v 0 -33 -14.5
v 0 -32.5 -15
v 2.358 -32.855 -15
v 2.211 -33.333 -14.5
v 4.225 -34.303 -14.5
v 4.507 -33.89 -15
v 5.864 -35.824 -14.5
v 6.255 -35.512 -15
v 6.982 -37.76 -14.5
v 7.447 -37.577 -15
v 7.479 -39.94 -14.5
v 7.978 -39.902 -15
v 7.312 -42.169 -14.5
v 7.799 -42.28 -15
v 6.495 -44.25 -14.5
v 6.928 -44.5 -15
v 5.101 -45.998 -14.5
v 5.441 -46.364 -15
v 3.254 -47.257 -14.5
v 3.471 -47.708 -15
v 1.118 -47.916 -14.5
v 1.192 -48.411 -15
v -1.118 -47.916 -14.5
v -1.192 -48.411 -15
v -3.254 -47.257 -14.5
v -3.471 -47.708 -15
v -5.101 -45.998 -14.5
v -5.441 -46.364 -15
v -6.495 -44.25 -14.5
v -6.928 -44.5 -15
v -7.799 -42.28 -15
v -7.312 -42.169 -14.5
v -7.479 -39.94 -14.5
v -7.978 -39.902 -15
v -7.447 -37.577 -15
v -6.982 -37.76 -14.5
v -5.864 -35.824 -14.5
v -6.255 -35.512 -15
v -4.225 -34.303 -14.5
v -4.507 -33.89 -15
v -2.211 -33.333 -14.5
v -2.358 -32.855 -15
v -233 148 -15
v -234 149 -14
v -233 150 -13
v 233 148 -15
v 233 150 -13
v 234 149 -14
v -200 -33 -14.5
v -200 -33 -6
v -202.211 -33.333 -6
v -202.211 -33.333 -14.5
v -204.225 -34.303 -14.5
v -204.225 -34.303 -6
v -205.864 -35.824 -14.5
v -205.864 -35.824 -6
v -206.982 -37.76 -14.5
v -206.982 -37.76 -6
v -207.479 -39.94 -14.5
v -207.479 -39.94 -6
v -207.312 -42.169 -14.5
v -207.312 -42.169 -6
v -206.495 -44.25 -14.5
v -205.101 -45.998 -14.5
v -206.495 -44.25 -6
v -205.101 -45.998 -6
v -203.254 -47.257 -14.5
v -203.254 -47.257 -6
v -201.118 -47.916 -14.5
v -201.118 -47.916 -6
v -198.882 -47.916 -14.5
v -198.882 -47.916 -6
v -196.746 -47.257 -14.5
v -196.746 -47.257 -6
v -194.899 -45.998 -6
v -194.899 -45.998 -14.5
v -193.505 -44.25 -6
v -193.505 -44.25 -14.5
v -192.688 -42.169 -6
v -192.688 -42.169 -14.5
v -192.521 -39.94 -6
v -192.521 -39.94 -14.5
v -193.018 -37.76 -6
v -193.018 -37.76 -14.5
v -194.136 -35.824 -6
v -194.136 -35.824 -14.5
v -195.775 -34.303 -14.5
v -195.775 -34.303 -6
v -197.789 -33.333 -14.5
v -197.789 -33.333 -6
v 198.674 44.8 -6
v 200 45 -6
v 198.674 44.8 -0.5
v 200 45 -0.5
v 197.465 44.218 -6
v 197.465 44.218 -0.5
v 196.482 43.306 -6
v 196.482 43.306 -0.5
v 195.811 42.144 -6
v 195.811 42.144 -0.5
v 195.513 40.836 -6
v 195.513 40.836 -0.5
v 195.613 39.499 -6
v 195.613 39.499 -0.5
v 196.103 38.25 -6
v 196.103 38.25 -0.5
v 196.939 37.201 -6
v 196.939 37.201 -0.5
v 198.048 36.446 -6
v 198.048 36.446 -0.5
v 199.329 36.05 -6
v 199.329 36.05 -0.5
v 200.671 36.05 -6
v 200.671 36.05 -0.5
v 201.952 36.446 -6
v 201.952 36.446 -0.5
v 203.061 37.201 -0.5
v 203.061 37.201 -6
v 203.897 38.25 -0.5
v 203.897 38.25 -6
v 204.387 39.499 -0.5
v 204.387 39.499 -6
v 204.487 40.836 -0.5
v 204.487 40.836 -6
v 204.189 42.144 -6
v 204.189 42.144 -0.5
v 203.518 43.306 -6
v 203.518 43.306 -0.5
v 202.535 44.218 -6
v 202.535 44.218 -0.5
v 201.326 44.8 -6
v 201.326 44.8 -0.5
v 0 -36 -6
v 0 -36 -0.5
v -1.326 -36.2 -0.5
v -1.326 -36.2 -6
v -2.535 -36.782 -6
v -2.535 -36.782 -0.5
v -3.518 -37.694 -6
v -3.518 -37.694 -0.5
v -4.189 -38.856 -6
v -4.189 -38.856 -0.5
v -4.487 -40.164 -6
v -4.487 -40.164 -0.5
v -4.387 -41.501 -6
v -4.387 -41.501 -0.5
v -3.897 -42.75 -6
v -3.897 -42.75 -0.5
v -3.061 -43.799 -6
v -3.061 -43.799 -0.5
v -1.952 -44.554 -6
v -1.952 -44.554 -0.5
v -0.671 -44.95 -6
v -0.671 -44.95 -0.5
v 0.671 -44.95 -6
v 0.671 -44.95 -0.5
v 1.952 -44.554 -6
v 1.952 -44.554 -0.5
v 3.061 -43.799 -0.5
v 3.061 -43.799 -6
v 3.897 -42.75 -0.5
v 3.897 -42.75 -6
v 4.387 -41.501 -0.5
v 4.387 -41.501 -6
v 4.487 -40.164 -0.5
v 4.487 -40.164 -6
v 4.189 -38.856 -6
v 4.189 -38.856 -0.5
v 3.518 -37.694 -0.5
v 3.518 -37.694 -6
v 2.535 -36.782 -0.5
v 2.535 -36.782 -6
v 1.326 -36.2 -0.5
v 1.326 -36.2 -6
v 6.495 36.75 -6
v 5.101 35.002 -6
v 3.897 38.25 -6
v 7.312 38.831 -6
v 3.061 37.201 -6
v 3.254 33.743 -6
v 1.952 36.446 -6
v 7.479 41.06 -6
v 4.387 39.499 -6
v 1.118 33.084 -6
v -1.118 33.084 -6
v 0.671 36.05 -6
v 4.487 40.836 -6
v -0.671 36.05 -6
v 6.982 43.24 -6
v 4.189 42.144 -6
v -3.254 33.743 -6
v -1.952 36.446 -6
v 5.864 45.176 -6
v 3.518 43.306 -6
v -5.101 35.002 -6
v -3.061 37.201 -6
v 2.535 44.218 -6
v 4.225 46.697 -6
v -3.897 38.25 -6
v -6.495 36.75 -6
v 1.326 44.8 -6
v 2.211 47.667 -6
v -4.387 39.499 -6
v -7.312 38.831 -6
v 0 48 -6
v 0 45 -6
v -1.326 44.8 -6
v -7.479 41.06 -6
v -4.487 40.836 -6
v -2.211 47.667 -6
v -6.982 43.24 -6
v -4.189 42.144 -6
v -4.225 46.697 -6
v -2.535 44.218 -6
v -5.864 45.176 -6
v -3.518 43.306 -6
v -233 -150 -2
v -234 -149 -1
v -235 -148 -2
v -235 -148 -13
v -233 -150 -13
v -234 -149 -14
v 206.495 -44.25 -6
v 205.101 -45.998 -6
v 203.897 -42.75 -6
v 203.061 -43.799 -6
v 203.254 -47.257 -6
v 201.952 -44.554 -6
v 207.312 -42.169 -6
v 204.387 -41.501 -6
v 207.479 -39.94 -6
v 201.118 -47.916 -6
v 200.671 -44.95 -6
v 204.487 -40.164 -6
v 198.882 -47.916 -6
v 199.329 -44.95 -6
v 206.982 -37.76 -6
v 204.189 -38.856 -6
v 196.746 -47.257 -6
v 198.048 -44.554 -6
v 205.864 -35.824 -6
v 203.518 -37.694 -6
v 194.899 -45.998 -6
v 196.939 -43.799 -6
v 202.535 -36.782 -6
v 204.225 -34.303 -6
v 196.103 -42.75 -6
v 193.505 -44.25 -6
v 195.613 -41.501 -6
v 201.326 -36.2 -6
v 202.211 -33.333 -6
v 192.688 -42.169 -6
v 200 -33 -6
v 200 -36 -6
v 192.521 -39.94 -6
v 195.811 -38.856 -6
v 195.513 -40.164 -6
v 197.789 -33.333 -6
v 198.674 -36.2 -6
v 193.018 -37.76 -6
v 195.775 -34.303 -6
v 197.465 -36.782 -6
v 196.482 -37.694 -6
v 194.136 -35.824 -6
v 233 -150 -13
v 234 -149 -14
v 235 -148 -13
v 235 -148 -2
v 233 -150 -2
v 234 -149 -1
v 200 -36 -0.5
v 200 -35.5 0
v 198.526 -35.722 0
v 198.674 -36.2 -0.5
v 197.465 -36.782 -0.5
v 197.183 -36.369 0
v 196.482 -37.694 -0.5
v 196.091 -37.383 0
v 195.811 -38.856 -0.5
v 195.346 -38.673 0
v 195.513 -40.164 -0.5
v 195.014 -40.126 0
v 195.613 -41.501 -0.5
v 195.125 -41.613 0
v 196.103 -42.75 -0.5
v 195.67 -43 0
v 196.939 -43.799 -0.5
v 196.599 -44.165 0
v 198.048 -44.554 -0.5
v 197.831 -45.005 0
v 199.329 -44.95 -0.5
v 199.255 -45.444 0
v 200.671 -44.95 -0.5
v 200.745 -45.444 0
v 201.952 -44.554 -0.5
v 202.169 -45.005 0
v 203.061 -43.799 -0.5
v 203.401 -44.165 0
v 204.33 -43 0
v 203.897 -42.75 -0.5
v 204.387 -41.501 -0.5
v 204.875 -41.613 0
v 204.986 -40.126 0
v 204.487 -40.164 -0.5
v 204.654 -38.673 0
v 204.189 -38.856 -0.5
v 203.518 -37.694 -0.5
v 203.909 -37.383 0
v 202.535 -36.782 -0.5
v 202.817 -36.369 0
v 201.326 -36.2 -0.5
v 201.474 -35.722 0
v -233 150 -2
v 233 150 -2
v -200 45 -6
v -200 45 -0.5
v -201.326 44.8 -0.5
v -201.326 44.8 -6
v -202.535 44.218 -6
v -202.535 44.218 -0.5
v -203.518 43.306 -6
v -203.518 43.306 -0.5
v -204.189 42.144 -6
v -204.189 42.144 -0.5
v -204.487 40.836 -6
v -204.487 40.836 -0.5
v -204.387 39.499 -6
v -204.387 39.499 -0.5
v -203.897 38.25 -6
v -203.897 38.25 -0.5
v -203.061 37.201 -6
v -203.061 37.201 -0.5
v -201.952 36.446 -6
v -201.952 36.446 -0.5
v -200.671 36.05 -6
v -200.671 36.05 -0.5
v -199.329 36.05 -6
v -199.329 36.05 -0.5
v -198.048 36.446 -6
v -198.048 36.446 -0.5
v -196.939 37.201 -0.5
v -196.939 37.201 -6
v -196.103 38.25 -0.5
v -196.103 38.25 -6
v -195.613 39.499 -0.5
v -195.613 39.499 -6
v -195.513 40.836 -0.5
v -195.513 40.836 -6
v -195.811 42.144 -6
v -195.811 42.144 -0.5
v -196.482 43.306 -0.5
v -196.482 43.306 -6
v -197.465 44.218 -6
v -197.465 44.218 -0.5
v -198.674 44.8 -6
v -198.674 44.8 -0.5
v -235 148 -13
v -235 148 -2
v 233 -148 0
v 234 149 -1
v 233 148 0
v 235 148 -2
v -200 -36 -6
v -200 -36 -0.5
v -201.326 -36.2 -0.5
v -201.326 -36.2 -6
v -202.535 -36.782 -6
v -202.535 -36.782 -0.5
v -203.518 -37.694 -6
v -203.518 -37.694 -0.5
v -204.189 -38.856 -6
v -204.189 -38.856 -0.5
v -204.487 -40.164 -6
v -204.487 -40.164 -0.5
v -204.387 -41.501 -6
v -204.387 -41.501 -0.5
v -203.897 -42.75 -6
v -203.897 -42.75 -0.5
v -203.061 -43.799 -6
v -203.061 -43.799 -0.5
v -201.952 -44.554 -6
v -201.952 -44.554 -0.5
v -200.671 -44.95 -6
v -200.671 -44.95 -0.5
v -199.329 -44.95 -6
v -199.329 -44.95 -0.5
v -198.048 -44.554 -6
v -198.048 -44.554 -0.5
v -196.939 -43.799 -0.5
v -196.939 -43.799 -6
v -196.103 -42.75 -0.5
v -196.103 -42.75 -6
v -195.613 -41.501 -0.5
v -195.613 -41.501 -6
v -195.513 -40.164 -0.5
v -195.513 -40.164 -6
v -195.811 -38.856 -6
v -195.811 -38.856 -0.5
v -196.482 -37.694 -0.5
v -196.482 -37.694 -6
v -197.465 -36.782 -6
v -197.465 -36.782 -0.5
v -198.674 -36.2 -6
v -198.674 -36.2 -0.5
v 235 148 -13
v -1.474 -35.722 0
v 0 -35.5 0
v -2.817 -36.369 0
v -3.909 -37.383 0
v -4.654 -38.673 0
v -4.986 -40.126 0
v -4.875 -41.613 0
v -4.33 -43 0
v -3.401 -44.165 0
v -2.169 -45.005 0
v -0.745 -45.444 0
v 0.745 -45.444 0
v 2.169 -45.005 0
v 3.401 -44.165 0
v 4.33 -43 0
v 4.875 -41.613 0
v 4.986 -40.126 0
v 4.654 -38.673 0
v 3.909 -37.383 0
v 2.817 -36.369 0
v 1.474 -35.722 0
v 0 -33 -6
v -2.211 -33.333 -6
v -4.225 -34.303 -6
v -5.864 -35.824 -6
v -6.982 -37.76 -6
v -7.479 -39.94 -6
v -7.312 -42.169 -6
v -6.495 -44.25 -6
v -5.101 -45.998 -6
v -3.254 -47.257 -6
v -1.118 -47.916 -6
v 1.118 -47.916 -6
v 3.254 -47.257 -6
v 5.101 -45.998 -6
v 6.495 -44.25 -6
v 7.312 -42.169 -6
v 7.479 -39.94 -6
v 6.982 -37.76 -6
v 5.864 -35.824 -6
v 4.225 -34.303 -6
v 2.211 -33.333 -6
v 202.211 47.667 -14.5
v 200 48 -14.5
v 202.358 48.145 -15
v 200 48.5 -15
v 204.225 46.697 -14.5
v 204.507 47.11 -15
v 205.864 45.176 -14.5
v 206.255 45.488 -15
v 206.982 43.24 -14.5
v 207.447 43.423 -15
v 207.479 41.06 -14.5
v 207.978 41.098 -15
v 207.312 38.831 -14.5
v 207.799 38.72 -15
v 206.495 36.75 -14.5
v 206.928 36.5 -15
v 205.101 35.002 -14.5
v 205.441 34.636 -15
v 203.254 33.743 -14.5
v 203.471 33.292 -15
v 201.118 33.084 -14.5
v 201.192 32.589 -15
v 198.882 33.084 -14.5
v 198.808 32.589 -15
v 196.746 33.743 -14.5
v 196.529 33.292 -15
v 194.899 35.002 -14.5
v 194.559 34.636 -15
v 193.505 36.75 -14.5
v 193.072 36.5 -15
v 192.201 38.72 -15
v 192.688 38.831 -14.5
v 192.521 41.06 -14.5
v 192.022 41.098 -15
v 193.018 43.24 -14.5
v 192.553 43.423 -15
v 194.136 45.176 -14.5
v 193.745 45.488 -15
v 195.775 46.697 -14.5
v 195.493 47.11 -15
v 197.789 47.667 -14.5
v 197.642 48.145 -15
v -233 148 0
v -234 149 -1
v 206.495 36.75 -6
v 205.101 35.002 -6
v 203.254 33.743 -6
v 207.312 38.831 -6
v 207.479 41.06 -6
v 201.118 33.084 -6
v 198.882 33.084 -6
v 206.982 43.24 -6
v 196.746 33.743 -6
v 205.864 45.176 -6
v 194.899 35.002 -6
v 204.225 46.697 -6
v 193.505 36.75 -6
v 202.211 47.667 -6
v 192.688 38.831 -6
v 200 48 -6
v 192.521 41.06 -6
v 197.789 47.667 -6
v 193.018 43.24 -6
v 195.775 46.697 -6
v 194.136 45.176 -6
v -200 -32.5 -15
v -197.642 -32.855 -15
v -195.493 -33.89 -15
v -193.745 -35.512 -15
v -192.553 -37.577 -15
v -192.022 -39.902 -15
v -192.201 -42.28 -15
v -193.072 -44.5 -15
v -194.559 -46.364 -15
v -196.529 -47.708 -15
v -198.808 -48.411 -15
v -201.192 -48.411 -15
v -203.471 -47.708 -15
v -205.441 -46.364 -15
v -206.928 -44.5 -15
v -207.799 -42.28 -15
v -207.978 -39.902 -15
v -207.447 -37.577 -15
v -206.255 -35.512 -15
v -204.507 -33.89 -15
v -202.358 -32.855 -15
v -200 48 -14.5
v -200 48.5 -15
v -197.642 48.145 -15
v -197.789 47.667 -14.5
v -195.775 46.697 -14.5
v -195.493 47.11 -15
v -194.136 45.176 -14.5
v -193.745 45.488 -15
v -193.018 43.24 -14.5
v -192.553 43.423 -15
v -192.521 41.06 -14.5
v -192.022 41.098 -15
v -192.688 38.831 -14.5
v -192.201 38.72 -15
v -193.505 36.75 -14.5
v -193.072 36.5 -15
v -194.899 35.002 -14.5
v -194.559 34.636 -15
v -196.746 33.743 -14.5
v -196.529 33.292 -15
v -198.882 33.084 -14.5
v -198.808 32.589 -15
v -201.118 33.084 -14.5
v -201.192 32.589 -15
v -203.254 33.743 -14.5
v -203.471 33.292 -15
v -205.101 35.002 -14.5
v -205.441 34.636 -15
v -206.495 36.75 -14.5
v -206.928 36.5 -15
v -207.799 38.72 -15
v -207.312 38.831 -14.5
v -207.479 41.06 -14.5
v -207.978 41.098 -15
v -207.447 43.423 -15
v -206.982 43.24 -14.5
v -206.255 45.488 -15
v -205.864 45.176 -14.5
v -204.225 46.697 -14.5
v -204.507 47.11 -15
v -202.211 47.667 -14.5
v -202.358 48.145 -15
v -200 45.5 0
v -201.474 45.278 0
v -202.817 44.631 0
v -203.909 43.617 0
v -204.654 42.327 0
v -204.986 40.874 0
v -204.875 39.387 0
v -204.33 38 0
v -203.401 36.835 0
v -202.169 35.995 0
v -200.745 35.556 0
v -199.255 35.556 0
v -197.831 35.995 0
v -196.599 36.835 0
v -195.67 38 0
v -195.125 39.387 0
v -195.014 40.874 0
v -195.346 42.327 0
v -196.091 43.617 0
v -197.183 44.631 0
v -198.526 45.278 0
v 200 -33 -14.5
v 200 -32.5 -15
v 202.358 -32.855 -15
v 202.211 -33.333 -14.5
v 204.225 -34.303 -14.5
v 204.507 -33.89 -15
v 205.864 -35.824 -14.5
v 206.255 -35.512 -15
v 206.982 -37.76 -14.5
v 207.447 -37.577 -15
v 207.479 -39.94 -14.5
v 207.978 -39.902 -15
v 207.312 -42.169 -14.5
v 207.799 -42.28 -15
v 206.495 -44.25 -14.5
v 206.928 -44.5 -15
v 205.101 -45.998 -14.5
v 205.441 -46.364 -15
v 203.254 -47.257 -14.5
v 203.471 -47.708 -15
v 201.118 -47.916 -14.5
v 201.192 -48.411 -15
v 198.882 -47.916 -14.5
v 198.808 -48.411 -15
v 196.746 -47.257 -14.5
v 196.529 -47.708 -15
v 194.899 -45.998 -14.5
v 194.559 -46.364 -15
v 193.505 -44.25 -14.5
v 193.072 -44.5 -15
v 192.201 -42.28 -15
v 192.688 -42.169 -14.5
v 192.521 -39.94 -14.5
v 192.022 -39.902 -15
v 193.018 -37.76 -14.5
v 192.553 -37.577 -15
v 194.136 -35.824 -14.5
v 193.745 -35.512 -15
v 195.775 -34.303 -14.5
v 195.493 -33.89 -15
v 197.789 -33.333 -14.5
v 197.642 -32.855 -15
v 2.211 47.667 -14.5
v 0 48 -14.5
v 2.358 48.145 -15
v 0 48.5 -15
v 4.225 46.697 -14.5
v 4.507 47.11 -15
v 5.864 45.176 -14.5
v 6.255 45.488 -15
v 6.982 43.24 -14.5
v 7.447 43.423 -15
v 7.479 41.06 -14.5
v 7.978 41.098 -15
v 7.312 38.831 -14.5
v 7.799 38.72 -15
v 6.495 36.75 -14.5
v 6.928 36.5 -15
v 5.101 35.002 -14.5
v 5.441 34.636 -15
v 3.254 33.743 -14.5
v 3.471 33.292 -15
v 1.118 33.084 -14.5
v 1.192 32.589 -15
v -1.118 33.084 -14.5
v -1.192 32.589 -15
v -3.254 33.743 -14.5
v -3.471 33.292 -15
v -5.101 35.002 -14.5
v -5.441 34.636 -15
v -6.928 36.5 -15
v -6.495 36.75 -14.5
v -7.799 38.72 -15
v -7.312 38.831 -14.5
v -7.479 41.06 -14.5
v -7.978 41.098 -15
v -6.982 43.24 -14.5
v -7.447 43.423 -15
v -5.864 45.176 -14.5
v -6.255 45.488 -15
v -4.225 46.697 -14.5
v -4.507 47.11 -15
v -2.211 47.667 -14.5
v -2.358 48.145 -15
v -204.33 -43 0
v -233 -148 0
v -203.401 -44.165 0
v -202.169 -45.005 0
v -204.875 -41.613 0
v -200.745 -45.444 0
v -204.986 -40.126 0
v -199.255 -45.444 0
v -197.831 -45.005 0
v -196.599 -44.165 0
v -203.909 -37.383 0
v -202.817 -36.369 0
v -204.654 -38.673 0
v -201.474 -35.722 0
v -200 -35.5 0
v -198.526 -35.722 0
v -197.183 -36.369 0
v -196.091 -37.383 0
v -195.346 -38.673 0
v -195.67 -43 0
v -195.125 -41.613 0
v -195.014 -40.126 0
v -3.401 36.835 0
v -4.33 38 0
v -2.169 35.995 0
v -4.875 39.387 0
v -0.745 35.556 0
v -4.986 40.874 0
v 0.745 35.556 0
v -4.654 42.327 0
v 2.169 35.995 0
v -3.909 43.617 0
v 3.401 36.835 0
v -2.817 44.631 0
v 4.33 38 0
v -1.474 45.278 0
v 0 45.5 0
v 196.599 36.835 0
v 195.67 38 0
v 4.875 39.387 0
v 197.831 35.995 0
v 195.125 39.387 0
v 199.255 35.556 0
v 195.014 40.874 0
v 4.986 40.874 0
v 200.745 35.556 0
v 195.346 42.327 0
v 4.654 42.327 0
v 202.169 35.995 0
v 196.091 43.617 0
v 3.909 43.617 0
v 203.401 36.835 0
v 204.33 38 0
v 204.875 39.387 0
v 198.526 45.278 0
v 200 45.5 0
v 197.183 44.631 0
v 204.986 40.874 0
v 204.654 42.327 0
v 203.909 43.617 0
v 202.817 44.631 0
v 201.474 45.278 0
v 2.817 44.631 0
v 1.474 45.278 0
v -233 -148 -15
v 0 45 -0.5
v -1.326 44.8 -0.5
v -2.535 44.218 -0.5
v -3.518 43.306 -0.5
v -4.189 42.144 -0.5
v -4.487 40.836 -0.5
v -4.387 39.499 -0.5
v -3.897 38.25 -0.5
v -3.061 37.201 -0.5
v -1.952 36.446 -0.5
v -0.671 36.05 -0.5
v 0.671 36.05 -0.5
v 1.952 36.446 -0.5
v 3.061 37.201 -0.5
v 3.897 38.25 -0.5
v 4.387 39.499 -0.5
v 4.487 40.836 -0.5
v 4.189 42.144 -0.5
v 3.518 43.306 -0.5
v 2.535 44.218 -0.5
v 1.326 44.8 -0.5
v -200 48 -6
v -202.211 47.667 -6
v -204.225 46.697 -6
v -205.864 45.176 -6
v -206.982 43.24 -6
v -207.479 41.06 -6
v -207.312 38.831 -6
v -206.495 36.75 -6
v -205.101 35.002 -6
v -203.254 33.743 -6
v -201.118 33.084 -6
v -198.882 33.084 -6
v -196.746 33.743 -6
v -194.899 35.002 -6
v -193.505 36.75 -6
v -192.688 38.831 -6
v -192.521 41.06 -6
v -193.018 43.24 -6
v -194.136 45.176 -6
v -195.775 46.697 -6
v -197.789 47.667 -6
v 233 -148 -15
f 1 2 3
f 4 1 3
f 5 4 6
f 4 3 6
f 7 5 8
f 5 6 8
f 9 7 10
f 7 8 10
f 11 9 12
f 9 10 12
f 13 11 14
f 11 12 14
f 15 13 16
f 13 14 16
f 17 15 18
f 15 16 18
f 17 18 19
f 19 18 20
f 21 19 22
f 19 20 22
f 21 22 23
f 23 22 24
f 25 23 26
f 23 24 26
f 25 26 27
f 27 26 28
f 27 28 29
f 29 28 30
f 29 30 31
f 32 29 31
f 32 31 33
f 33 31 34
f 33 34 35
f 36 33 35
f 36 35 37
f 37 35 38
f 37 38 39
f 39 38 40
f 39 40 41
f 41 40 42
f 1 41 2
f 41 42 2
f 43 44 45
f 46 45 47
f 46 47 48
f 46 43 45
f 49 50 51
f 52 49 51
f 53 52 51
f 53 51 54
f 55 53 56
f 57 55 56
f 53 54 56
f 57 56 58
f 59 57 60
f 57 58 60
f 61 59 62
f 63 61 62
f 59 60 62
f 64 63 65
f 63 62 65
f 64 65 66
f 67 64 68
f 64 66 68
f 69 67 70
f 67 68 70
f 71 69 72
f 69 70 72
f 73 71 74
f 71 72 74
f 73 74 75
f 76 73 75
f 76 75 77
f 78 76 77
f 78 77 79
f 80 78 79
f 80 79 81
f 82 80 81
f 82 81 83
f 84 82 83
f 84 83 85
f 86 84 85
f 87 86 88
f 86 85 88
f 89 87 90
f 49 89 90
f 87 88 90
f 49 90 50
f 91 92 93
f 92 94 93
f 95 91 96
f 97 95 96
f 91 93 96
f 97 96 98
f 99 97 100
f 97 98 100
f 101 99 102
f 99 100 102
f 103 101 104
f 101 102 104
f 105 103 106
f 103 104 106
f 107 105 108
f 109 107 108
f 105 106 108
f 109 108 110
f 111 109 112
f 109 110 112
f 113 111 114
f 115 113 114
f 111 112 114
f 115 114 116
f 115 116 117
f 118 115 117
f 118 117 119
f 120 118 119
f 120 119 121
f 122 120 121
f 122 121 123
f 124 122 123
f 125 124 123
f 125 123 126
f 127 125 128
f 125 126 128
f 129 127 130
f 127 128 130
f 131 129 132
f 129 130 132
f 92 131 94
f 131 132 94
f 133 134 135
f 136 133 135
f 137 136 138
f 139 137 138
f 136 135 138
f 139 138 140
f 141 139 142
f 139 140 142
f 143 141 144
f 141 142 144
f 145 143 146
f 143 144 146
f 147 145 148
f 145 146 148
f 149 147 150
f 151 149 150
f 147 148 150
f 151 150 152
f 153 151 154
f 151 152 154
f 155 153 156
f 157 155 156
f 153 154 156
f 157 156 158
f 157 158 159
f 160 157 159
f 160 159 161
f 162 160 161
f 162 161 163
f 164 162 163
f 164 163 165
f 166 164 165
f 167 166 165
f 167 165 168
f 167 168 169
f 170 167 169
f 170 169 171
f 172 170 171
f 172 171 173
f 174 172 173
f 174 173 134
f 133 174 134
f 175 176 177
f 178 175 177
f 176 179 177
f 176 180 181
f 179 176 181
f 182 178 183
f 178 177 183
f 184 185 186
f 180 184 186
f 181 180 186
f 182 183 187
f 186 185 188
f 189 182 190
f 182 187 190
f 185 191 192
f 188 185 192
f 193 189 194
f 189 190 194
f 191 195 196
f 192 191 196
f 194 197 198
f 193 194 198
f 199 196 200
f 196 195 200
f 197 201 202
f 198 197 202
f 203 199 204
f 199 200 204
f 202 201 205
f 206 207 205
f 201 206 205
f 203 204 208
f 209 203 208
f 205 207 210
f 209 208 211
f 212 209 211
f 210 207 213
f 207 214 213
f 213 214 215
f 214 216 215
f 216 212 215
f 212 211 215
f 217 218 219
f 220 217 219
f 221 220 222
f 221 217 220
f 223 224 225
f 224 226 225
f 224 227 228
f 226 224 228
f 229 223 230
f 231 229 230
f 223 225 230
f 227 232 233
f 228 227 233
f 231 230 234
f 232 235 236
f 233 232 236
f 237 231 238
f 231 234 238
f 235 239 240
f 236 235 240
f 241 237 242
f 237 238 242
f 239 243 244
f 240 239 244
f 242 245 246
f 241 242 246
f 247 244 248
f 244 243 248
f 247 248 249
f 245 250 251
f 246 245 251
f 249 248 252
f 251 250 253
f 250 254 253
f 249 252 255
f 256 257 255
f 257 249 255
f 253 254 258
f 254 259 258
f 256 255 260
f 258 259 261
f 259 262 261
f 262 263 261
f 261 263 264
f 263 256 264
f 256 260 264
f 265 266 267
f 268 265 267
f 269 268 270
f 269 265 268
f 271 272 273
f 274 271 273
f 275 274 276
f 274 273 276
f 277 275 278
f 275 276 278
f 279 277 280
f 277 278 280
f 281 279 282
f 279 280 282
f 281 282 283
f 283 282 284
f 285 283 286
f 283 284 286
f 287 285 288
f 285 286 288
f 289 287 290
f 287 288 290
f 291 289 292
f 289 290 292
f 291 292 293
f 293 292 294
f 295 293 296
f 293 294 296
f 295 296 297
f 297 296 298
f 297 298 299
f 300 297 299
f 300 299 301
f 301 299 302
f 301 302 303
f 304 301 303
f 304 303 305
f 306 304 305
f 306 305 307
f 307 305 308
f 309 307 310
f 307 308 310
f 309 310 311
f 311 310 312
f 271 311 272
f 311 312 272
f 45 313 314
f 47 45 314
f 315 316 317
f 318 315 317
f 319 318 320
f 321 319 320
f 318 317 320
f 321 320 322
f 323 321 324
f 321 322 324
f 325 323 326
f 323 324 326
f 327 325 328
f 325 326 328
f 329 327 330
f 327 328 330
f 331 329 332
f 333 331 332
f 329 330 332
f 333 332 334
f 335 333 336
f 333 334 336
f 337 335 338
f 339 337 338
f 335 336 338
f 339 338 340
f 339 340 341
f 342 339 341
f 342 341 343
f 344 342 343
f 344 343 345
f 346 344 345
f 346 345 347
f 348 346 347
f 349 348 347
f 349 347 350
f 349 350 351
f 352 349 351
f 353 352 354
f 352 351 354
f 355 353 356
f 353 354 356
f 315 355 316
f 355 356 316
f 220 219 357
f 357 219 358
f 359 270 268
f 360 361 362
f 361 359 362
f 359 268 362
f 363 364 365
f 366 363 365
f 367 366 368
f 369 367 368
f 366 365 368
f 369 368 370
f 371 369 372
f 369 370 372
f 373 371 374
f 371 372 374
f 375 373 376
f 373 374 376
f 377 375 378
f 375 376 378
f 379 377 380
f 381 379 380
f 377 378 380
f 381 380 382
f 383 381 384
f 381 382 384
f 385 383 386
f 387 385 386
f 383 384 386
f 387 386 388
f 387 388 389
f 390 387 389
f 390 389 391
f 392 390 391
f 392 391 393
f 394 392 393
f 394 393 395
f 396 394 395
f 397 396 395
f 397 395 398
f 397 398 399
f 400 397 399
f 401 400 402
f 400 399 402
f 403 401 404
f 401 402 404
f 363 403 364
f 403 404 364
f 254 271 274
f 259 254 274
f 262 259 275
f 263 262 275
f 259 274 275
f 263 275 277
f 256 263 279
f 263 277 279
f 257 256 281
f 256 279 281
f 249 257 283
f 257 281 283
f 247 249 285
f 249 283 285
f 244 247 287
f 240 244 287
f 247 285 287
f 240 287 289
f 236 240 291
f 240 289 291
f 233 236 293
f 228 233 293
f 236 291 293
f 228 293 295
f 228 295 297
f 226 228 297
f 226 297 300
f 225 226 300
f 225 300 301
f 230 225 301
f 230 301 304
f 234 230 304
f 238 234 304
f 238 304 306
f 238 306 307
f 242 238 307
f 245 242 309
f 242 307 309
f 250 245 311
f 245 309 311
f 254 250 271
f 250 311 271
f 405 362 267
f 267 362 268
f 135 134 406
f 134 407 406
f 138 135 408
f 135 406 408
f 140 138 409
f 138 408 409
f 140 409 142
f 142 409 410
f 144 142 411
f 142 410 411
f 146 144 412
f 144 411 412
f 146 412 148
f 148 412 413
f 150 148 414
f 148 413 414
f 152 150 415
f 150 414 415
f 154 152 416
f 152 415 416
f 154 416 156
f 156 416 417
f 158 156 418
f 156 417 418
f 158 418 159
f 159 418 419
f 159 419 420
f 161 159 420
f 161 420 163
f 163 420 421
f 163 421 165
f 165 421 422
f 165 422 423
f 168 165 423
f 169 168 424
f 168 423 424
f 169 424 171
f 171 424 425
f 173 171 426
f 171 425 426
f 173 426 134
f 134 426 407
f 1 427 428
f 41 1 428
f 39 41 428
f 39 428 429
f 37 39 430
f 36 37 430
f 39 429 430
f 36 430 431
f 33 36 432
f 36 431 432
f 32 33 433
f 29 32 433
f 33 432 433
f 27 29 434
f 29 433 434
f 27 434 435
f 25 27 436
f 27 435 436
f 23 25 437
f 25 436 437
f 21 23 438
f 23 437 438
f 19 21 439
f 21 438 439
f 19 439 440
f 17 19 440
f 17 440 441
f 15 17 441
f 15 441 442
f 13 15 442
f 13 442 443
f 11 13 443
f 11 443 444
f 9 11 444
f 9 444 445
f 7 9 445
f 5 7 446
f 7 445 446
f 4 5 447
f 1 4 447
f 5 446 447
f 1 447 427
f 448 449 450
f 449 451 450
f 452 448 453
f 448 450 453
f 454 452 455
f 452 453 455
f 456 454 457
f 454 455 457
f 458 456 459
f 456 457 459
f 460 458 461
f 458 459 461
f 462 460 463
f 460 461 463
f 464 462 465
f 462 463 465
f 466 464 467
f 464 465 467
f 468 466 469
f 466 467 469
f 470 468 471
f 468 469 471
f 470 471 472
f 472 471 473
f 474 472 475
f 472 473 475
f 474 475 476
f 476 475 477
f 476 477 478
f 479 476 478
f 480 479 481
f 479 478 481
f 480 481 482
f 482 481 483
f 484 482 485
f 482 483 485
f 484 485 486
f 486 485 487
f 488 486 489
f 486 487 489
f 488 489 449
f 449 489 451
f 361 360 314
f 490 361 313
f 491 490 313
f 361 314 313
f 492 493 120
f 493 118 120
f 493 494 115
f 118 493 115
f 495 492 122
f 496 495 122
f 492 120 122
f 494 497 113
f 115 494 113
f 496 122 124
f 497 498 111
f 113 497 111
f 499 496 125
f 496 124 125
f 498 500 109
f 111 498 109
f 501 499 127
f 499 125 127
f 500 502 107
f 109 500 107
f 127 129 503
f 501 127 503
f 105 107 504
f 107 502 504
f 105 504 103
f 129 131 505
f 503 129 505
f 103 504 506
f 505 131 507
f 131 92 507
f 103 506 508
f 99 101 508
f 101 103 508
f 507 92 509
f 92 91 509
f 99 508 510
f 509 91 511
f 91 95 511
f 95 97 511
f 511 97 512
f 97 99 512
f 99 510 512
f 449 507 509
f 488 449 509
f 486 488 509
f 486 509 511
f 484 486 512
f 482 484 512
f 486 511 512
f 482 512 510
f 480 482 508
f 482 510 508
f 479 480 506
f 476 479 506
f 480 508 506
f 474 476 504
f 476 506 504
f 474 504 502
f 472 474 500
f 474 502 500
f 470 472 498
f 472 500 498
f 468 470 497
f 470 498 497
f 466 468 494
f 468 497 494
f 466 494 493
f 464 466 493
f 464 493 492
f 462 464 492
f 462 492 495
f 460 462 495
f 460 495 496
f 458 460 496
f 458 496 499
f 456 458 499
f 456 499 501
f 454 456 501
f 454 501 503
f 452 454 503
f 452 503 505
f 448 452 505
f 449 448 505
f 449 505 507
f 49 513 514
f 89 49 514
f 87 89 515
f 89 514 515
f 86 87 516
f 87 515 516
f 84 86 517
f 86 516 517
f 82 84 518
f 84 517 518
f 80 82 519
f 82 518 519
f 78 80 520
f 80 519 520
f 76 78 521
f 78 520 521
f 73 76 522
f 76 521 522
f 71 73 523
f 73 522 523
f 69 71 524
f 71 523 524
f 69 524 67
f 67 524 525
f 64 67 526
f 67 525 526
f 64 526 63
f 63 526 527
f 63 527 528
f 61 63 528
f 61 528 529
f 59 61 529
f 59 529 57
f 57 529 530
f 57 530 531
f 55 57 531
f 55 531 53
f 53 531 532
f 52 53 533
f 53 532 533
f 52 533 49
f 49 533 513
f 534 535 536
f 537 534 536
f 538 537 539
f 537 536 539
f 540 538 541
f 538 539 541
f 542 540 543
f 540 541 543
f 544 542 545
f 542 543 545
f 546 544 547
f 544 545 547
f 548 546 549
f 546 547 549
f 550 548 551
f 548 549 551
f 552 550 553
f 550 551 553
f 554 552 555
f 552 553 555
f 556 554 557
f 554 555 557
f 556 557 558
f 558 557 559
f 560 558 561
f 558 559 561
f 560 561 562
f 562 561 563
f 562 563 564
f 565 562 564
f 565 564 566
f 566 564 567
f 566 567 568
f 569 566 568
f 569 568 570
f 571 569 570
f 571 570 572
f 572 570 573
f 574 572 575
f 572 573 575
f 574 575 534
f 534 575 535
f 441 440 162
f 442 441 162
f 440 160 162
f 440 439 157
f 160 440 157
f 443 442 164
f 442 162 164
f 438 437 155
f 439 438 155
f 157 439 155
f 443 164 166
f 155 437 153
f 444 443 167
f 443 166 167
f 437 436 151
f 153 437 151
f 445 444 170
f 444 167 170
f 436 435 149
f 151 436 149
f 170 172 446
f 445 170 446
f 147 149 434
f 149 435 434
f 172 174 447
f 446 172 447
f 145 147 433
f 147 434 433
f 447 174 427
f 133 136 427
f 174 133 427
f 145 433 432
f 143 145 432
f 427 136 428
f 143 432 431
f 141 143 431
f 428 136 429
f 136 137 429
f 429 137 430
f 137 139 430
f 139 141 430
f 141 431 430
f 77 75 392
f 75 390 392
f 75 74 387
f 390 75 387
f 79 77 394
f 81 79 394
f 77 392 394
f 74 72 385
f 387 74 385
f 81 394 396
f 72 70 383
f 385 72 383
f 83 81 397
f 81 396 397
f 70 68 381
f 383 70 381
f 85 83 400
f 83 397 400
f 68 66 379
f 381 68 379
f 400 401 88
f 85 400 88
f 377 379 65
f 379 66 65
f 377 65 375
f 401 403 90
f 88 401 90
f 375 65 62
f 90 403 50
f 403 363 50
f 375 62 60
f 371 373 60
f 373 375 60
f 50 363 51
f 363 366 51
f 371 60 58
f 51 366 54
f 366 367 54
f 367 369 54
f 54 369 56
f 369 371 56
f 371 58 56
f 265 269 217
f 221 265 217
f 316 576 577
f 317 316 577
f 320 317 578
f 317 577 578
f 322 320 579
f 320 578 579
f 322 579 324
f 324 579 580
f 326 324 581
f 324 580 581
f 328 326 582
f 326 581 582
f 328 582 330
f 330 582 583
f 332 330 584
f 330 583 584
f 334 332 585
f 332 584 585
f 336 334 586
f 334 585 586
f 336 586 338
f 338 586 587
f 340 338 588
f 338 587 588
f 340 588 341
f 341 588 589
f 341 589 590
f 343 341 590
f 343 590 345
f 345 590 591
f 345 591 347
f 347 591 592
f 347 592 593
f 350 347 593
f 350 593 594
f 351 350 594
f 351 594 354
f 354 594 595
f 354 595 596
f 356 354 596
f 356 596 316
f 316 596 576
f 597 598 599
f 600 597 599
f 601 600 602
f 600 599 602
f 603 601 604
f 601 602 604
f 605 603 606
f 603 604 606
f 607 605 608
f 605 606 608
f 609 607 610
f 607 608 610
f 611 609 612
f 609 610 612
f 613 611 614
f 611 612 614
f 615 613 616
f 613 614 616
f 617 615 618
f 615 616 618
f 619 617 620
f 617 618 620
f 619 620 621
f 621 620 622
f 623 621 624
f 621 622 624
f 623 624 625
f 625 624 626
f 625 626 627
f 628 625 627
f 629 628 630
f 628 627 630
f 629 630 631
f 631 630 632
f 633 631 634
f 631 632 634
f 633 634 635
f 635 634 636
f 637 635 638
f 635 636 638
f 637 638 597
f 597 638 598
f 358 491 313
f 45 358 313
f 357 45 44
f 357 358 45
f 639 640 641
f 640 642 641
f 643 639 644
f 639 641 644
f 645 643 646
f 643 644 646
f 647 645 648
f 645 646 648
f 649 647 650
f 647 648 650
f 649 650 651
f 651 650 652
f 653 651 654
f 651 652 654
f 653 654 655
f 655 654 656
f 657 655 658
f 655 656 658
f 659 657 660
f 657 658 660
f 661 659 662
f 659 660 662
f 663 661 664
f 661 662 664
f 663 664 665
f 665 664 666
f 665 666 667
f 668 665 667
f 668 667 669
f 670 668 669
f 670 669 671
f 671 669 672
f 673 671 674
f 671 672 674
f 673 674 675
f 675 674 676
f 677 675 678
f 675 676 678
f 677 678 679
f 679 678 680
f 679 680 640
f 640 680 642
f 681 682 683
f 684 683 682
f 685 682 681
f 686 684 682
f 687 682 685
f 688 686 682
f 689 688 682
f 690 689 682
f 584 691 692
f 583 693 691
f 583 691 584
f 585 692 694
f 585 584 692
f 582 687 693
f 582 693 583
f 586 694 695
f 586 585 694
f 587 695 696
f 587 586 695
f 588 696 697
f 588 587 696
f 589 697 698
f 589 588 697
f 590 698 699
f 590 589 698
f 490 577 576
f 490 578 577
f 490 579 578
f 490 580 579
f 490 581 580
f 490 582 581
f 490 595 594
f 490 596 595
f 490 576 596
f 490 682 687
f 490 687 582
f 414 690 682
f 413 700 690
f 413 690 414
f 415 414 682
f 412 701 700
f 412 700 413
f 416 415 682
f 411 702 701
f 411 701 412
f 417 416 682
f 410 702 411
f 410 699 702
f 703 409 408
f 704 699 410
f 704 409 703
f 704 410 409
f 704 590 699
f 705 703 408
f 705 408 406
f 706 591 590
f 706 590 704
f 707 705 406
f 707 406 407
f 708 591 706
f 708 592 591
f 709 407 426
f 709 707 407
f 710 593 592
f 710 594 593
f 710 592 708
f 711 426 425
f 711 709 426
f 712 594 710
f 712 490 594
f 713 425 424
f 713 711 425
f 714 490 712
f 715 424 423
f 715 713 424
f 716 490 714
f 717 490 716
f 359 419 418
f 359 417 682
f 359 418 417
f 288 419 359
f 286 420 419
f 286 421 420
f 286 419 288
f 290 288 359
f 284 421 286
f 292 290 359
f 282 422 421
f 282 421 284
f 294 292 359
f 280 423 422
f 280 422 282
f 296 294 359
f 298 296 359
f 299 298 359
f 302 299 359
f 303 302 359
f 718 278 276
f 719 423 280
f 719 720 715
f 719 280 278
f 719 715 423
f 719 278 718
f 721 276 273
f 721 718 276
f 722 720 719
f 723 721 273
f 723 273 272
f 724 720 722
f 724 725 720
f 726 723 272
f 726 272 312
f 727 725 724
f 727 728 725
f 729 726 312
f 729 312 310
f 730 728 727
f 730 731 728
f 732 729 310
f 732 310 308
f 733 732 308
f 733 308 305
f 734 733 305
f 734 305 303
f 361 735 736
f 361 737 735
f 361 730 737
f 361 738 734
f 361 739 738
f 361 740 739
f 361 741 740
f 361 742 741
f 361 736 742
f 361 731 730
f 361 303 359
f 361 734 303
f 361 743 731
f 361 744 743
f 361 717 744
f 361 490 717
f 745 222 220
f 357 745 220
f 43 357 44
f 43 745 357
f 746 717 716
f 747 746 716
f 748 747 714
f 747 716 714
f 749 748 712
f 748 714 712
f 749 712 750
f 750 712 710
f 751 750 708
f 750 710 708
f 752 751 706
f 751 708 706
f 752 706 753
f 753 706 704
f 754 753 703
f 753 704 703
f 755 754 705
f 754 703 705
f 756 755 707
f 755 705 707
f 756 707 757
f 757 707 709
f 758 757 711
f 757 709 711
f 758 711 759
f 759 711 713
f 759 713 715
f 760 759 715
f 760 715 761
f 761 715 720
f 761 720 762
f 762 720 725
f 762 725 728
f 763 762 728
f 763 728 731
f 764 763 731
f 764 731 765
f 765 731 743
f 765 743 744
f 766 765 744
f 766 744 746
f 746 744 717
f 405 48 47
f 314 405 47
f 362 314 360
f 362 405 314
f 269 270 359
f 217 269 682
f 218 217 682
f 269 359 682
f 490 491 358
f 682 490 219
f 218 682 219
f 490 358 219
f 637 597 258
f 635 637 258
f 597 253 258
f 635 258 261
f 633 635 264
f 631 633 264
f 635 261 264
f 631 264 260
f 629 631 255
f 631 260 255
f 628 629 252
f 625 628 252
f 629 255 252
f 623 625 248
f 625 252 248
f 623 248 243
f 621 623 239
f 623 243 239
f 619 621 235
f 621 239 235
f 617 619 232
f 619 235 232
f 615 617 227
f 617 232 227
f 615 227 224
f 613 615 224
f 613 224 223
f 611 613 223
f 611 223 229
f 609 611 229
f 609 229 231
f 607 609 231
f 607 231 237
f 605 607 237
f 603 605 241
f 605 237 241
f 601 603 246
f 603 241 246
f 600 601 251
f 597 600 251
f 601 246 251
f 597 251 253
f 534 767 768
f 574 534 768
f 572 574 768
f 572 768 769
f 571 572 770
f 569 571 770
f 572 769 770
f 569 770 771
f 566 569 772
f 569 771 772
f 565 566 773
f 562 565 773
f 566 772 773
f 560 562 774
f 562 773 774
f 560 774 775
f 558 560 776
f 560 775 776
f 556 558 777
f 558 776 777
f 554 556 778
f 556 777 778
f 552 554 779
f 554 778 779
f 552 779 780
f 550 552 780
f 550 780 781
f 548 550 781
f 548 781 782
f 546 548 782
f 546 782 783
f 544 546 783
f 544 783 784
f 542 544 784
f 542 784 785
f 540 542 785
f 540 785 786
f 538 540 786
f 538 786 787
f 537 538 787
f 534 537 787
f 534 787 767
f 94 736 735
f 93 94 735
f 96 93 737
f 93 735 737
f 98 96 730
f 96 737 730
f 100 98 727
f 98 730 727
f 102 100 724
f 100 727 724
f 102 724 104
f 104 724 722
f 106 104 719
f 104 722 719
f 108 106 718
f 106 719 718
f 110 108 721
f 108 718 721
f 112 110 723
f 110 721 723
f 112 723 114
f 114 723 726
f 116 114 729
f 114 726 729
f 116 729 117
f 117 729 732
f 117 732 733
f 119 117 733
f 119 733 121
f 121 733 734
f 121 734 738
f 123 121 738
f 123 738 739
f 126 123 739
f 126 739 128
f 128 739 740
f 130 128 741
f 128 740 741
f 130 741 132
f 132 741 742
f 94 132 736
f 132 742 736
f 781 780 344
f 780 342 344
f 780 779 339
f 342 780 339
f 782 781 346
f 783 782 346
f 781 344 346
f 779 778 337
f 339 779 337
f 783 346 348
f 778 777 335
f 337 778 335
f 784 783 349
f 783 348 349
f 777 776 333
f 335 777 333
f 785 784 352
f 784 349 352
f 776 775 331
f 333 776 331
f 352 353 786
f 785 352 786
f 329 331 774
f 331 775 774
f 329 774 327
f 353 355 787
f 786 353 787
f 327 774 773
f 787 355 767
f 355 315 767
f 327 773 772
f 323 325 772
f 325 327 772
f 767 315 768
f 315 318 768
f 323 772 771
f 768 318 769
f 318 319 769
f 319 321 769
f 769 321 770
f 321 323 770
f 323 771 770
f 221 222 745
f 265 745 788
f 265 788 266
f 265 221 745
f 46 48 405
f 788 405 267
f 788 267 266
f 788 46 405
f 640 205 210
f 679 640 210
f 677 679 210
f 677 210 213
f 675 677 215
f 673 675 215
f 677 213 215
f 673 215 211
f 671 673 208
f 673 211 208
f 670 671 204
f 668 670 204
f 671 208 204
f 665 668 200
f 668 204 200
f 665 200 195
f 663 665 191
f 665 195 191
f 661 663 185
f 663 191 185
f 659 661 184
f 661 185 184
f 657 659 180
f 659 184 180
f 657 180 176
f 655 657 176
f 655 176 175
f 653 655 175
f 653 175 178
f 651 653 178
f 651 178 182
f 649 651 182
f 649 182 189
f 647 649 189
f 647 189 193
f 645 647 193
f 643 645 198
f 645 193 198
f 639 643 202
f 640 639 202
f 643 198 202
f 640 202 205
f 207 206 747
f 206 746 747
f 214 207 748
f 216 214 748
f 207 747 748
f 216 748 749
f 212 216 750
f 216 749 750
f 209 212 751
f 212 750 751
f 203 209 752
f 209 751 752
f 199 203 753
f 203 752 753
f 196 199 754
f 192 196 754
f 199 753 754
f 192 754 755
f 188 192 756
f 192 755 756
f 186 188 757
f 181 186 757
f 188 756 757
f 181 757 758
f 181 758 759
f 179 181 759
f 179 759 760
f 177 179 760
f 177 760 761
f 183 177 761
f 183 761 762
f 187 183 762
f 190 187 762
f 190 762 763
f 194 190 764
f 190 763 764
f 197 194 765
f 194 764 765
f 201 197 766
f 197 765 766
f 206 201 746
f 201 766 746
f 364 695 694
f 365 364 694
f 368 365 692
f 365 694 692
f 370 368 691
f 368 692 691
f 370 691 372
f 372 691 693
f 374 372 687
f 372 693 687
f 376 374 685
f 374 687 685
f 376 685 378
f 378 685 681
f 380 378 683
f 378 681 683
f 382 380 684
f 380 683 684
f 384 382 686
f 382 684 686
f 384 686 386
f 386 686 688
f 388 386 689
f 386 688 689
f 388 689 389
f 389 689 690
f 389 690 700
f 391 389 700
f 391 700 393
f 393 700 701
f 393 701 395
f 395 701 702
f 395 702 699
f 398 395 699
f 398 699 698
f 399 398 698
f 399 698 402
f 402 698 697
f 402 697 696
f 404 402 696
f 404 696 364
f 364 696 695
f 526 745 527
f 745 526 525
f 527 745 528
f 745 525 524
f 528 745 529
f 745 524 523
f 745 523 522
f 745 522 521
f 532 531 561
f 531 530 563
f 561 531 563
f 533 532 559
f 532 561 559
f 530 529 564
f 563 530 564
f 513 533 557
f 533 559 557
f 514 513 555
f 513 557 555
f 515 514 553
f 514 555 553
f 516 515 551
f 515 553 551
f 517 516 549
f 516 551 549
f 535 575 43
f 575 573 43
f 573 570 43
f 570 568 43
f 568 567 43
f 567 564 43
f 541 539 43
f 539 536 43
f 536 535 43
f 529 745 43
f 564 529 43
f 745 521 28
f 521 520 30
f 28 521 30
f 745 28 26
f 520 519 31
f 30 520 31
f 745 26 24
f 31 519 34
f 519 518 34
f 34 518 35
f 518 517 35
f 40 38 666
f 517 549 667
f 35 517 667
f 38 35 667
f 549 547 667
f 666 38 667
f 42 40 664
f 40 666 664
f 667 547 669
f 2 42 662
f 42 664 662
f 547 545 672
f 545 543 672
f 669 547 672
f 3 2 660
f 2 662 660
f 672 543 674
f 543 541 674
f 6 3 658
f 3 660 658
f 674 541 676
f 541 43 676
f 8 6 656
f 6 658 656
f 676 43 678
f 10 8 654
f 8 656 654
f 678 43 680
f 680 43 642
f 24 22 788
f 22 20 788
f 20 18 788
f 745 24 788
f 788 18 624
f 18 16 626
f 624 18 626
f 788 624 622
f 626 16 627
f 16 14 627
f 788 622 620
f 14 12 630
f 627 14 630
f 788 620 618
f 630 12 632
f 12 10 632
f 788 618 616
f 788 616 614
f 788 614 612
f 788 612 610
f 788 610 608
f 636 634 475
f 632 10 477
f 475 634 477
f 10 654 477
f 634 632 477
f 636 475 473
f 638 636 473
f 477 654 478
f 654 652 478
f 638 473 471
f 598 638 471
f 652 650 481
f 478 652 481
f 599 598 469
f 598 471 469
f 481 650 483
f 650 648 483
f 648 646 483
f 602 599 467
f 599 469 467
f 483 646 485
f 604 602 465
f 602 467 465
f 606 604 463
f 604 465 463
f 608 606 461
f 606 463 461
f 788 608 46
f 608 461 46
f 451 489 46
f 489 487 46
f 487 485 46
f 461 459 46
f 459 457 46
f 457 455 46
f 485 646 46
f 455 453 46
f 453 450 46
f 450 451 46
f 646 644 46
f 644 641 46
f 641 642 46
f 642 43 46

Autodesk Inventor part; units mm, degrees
ref_plane "XY Plane" through (0, 0, 0) normal (0, 0, 1) x (1, 0, 0)
sketch "Skizze1" plane through (0, 0, 0) normal (0, 0, 1) x (1, 0, 0)
  line L0 (-235, 150) -> (235, 150)
  line L1 (235, 150) -> (235, -150)
  line L2 (235, -150) -> (-235, -150)
  line L3 (-235, -150) -> (-235, 150)
  line L4 (-235, 150) -> (235, -150) construction
  line L5 (235, 150) -> (-235, -150) construction
  point P0 (0, 0)
  dimension "d0" = 300
  dimension "d1" = 470
extrude "Extrusion1" add sketch "Skizze1" against normal blind 15
sketch "Skizze2" plane through (0, 0, -15) normal (0, 0, -1) x (-1, 0, 0)
  line L0 (-235, -150) -> (235, -150) projected
  line L1 (235, -150) -> (235, 150) projected
  line L2 (235, 150) -> (-235, 150) projected
  line L3 (-235, 150) -> (-235, -150) projected
  point P0 (0, 0)
  point P1 (0, 40.5)
  point P2 (0, -40.5)
  dimension "d4" = 40.5
  dimension "d5" = 40.5
hole "Bohrung1" at (0, 40.5, -15) at (0, -40.5, -15) direction (0, 0, 1) diameter 9 end through all counterbore diameter 15 counterbore depth 9
pattern_linear "Rechteckige Anordnung1" count 2 spacing 200 along (1, 0, 0) count 2 spacing 200 along (-1, 0, 0) of "Bohrung1"
chamfer "Fasen1" distance 2 angle 45 4 edges at (235, -150, -7.5) (235, 150, -7.5) (-235, 150, -7.5) (-235, -150, -7.5)
chamfer "Fasen2" distance 2 angle 45 8 edges at (0, -150, -15) (0, -150, 0) (-235, 0, 0) (-235, 0, -15) (0, 150, 0) (0, 150, -15) (235, 0, 0) (235, 0, -15)
chamfer "Fasen3" distance 0.5 angle 45 6 edges at (-200, -48, -15) (-200, 33, -15) (0, -48, -15) (0, 33, -15) (200, -48, -15) (200, 33, -15)
chamfer "Fasen4" distance 0.5 angle 45 6 edges at (-200, -45, 0) (-200, 36, 0) (0, -45, 0) (0, 36, 0) (200, -45, 0) (200, 36, 0)
properties part number "Bodenplatte-Segment"
